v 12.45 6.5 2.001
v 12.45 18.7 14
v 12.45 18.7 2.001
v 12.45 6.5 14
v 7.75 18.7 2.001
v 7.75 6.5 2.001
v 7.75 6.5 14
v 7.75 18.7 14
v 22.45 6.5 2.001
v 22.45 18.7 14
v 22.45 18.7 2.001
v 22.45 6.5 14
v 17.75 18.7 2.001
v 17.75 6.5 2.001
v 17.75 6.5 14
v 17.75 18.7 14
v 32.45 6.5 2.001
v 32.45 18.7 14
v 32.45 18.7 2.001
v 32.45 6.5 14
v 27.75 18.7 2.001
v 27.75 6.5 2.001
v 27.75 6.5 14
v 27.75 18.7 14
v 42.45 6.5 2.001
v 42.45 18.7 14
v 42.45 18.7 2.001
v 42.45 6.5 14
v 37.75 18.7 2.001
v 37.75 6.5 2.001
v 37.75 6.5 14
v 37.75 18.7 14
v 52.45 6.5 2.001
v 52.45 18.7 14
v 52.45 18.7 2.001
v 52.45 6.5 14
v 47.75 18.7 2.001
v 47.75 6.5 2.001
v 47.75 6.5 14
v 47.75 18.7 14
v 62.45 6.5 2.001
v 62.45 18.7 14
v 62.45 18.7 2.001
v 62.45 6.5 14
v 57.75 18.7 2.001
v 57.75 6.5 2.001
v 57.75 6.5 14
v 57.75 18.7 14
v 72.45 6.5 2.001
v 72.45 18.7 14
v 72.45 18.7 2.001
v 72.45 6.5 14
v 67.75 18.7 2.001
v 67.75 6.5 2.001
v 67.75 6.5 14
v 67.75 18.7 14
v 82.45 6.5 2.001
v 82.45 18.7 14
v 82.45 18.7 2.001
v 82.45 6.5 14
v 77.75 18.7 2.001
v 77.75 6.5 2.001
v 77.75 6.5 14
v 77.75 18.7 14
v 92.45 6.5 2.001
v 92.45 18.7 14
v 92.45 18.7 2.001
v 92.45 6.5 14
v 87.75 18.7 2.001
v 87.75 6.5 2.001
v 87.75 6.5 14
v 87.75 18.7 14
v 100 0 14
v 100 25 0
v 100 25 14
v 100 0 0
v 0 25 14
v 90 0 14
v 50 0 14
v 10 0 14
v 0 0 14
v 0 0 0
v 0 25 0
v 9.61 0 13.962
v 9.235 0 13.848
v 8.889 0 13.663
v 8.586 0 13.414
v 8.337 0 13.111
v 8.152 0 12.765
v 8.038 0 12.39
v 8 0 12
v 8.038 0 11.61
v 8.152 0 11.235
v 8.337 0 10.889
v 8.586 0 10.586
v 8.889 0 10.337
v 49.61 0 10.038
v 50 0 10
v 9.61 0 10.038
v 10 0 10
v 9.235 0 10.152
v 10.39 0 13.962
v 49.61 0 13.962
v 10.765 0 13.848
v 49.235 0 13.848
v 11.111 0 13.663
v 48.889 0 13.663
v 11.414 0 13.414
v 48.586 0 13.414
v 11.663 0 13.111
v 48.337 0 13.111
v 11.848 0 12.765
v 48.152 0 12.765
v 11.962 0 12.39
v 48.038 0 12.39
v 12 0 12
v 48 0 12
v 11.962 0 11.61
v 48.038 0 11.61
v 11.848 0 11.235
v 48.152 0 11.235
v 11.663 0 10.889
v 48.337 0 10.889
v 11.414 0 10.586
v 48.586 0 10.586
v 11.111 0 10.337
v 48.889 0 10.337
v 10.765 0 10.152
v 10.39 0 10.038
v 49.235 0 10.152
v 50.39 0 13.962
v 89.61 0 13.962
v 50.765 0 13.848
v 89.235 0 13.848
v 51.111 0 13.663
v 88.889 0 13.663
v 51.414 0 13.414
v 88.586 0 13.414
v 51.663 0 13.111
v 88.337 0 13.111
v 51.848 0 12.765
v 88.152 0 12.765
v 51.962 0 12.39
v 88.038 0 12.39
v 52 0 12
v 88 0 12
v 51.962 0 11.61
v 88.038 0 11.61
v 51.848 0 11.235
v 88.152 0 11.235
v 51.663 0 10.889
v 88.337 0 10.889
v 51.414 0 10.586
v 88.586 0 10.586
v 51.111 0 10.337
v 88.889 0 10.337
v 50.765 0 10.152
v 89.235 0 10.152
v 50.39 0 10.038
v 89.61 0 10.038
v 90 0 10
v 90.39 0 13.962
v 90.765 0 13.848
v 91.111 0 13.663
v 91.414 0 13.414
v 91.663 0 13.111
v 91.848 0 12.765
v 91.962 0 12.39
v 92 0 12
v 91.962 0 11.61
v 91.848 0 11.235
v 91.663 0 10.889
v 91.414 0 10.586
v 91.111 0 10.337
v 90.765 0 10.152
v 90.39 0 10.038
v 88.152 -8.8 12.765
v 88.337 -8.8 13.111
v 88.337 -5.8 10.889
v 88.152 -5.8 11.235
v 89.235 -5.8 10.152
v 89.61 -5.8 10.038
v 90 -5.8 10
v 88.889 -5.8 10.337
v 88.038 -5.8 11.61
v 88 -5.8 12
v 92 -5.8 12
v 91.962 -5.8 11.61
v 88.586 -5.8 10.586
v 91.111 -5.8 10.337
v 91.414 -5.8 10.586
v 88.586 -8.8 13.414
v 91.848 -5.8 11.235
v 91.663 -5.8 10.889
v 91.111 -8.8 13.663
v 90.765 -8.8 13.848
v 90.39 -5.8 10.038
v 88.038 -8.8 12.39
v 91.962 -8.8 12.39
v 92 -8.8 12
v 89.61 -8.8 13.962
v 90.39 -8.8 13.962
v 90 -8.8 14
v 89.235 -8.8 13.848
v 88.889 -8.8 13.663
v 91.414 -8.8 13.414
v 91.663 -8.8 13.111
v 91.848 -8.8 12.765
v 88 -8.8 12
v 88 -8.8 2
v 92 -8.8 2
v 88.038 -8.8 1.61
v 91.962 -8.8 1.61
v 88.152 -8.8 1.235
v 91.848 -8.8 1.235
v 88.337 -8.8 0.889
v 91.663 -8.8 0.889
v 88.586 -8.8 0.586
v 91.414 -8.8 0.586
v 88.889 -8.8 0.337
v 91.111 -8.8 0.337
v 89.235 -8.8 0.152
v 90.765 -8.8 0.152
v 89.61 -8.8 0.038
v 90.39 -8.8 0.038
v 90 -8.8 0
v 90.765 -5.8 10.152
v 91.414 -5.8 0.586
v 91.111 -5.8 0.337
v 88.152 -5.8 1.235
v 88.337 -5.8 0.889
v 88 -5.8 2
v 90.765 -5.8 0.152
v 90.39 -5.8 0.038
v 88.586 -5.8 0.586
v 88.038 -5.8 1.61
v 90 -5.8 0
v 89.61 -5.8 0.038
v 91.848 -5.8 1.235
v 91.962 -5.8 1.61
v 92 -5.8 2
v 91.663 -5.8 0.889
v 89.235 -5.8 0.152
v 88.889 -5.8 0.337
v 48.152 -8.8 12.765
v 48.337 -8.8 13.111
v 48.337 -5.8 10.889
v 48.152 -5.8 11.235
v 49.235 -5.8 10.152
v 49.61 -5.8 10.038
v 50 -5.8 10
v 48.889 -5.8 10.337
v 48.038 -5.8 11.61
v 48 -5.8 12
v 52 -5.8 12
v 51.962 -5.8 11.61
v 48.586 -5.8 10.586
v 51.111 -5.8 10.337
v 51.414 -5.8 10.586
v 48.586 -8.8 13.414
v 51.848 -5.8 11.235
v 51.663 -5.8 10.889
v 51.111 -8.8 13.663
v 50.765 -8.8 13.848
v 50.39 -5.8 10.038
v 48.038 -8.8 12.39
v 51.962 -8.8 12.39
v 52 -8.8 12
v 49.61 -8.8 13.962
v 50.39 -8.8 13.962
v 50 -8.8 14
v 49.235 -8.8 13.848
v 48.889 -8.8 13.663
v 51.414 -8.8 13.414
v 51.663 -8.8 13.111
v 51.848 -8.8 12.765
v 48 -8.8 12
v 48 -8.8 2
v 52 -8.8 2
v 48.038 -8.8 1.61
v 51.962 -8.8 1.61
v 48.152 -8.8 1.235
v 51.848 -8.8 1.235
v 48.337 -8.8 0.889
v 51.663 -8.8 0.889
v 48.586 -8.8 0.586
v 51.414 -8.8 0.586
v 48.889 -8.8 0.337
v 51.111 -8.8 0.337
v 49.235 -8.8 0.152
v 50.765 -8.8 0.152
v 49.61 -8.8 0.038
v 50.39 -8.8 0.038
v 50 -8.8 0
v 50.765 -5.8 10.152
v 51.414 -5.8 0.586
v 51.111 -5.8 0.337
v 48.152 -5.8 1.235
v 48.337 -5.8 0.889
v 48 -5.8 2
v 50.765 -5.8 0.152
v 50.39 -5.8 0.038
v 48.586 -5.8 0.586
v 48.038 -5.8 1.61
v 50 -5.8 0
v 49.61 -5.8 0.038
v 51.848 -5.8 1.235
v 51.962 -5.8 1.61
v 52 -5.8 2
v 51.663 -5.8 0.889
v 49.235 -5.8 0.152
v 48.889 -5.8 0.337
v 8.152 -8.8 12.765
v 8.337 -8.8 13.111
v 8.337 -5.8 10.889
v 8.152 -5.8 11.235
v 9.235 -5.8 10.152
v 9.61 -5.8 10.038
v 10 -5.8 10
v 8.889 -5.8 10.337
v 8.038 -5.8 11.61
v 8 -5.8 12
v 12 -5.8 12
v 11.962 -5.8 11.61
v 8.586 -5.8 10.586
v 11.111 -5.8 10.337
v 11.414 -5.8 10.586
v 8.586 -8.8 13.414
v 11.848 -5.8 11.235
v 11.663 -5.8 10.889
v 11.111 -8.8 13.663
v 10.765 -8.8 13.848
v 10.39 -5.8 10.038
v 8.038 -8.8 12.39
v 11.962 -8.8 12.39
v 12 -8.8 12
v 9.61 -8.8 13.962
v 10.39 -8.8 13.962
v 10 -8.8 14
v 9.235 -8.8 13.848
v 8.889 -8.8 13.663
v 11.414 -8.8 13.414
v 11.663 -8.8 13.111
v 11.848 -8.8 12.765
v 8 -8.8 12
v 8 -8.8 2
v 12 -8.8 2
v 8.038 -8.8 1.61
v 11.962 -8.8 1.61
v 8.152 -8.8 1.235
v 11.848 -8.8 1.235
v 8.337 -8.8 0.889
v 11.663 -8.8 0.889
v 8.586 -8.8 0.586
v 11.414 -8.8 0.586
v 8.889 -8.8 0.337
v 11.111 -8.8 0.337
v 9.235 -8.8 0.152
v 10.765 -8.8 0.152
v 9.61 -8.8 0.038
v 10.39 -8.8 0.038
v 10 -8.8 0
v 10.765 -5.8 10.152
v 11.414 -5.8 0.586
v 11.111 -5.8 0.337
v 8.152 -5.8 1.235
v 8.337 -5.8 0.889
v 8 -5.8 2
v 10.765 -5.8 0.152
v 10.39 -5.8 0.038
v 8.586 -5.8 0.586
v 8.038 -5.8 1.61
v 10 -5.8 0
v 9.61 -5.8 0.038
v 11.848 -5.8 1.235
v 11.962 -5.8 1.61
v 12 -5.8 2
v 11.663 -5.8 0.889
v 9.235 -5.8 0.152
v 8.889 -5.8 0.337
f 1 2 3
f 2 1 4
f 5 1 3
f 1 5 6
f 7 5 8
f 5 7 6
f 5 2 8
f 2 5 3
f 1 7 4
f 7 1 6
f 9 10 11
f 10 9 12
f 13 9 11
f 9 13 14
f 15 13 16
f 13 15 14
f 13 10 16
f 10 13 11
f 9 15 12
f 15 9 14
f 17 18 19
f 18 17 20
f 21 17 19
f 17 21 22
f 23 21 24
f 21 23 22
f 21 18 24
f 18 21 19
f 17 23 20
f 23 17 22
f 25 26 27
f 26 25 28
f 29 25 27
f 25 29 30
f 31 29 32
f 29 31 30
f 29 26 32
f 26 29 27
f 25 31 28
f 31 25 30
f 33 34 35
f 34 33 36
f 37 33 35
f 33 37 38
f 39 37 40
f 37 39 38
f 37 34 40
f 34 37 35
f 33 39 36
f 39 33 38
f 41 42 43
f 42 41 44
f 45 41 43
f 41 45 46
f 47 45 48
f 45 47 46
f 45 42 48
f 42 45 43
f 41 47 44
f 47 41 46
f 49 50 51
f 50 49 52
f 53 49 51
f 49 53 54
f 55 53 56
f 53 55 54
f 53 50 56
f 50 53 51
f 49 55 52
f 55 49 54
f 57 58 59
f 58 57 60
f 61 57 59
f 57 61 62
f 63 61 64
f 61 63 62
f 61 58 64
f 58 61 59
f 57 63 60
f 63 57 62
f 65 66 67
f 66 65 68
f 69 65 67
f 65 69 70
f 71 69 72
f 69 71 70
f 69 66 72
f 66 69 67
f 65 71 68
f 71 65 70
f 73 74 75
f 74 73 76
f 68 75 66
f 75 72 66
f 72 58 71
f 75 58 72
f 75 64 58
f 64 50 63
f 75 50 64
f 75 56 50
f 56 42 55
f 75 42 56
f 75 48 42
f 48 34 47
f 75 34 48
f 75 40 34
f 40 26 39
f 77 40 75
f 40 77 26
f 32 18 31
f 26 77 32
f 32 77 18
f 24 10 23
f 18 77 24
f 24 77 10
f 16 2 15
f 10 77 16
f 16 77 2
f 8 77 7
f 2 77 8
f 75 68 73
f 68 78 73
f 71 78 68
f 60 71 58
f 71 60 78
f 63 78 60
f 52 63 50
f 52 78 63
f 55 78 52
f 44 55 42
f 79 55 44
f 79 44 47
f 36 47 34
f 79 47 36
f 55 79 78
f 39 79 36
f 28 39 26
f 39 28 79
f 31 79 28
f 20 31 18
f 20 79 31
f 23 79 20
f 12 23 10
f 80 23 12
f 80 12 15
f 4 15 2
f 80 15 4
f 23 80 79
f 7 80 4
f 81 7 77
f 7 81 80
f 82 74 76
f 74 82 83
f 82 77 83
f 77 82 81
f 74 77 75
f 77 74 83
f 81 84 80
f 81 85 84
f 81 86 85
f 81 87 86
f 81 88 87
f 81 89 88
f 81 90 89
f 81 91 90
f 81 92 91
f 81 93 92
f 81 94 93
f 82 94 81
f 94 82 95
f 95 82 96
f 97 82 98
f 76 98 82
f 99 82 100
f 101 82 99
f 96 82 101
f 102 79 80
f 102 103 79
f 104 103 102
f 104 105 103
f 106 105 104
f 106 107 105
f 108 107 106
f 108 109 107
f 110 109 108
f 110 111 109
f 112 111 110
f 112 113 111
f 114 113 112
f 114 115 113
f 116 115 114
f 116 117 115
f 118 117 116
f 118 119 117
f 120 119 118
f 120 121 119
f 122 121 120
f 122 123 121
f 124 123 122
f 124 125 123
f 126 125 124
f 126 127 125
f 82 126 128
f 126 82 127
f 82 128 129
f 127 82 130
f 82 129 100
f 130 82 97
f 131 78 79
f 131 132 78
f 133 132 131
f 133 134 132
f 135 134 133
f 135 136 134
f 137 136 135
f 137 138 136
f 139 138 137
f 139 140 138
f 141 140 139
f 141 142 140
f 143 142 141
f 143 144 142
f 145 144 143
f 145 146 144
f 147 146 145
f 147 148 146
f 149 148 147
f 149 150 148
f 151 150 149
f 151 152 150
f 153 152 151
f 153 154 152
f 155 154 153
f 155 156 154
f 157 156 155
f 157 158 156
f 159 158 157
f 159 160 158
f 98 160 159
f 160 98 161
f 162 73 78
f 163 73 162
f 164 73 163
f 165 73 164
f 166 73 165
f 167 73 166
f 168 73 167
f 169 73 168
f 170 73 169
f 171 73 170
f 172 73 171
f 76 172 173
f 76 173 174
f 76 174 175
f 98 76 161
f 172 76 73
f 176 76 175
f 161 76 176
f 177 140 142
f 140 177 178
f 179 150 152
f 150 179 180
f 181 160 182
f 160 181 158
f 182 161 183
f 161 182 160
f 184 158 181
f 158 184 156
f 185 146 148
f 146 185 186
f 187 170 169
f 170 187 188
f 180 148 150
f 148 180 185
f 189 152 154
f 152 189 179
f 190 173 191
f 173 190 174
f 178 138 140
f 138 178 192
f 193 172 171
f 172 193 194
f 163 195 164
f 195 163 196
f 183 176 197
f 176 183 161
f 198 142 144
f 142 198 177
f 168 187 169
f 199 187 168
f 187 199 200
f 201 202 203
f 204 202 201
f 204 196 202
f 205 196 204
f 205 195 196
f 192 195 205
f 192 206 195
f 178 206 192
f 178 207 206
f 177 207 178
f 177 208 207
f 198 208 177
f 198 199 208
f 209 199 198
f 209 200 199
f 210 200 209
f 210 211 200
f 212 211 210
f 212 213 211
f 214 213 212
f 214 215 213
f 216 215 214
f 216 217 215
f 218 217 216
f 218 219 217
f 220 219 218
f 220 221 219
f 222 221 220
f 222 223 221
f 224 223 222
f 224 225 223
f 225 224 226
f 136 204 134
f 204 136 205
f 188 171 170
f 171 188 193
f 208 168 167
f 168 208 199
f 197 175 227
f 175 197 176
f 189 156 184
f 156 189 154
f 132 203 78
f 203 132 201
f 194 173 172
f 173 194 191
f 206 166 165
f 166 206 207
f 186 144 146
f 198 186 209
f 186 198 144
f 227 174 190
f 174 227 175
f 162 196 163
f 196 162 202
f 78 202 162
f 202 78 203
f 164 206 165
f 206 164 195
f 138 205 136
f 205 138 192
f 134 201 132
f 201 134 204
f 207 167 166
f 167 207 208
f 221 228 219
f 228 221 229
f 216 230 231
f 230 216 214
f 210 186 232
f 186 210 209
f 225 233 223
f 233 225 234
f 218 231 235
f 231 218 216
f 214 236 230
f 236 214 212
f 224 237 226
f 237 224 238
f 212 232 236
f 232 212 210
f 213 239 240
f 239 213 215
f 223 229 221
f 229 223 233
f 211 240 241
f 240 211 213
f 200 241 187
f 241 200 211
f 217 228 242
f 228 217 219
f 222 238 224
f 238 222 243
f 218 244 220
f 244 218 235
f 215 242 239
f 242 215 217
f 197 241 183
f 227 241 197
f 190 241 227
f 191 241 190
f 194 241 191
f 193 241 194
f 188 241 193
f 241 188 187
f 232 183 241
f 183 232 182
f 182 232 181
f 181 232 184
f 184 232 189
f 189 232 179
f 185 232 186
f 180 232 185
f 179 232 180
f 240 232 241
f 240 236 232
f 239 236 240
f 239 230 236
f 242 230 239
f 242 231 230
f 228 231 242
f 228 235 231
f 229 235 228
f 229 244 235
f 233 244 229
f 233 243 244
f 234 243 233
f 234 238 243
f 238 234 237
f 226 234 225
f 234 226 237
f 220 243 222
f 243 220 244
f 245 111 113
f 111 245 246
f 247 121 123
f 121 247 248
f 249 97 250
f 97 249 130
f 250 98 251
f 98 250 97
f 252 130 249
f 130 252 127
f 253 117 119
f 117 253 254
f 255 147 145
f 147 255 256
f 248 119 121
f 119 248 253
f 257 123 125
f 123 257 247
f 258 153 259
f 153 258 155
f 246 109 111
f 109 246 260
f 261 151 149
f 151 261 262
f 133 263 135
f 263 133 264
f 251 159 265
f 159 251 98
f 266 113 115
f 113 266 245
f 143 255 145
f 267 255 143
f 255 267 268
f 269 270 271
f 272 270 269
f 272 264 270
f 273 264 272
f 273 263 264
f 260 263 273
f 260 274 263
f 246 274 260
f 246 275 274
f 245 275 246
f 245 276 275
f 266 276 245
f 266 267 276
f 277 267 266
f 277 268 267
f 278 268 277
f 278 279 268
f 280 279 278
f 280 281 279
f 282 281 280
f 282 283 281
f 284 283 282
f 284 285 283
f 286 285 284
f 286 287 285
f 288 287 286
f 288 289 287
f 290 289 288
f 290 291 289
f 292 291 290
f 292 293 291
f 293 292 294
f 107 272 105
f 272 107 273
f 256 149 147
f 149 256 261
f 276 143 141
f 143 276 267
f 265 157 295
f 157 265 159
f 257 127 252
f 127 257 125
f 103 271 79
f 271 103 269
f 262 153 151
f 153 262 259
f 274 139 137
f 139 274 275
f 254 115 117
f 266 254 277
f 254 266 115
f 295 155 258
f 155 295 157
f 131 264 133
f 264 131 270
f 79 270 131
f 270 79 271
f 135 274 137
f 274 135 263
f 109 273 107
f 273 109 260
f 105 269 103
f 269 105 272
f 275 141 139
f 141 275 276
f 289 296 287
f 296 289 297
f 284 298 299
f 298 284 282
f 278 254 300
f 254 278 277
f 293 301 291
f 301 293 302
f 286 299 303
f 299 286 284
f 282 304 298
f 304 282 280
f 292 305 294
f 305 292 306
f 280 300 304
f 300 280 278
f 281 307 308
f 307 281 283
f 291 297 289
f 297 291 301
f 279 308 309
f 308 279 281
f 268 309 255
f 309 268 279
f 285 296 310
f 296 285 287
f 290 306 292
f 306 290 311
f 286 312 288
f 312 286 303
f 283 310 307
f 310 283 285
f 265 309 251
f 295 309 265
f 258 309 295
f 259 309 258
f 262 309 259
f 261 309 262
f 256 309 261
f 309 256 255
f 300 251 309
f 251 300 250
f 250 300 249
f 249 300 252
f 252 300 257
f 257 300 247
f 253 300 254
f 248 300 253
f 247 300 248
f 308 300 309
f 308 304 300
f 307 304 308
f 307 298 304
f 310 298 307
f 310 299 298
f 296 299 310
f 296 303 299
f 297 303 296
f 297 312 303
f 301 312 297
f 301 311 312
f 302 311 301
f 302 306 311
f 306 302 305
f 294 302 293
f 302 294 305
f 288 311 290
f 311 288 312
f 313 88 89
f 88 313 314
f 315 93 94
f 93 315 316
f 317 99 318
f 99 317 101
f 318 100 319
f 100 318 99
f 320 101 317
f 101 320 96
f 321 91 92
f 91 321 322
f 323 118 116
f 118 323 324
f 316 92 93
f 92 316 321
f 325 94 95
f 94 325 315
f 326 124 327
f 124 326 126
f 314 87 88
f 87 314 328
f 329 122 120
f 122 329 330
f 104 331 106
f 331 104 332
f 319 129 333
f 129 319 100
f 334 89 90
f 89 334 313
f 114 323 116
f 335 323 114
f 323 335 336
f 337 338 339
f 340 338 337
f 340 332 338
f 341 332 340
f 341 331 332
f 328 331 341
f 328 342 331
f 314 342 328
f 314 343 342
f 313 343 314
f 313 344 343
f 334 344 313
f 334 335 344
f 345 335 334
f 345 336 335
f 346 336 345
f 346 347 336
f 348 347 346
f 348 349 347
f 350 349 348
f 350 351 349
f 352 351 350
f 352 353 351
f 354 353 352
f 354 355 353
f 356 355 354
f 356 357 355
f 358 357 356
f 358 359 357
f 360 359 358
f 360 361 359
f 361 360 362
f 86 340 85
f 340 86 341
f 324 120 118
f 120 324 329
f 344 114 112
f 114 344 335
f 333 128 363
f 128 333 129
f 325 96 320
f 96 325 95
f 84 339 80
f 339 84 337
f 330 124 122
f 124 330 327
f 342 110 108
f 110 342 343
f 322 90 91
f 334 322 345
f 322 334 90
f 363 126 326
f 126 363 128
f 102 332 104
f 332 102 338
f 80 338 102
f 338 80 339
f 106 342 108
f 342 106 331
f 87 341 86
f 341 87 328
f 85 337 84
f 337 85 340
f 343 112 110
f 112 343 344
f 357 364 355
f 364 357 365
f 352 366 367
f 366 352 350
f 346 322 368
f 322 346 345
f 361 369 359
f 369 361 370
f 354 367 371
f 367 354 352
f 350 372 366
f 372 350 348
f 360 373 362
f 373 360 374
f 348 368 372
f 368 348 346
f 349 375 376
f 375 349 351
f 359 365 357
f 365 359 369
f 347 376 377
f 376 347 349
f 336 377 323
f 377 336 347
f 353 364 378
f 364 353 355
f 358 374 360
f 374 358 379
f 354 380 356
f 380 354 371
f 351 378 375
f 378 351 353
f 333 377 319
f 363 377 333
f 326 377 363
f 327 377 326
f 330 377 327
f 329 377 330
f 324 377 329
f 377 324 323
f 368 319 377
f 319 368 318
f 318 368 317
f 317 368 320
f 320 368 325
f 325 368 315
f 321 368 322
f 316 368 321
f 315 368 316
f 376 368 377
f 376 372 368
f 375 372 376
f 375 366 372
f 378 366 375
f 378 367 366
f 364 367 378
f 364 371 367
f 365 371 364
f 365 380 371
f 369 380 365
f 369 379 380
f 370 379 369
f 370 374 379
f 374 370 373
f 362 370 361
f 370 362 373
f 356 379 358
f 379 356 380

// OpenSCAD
// file: gancho.scad
module ganchos(n=1){    
    for (i=[0:1:n-1]){
        translate([0,40*i,,0]) rotate([0, 90, 0]) translate([0, 0, -9]) {
            cylinder(d = 4, h=9, $fn = 32);
            hull(){
                cylinder(d = 4, h=3, $fn = 32);
                translate([10, 0, 0]) cylinder(d = 4, h=3, $fn = 32);
            } 
        }
    }   
}

// ganchos(3);
// main file
include <gancho.scad>

// Create a hole for the USB connector
module hole(){
    tolerance = 0.2;    
    cube([4.5 + tolerance, 12 + tolerance, 15], center = false);
}

module holder(){
    difference(){
        cube([100, 25, 12 + 2], center = false);
        
        for (i = [0 : 8]){
            translate([i * 10 + (100-84.5)/2, (25 - 12) / 2, 2 + 0.001]){
                hole();
            }
        }
    }
    translate([80 + (100 - 80)/2, 0.2, 12]){
        rotate([0, 0, 90]) ganchos(3);
    }
}


holder();
